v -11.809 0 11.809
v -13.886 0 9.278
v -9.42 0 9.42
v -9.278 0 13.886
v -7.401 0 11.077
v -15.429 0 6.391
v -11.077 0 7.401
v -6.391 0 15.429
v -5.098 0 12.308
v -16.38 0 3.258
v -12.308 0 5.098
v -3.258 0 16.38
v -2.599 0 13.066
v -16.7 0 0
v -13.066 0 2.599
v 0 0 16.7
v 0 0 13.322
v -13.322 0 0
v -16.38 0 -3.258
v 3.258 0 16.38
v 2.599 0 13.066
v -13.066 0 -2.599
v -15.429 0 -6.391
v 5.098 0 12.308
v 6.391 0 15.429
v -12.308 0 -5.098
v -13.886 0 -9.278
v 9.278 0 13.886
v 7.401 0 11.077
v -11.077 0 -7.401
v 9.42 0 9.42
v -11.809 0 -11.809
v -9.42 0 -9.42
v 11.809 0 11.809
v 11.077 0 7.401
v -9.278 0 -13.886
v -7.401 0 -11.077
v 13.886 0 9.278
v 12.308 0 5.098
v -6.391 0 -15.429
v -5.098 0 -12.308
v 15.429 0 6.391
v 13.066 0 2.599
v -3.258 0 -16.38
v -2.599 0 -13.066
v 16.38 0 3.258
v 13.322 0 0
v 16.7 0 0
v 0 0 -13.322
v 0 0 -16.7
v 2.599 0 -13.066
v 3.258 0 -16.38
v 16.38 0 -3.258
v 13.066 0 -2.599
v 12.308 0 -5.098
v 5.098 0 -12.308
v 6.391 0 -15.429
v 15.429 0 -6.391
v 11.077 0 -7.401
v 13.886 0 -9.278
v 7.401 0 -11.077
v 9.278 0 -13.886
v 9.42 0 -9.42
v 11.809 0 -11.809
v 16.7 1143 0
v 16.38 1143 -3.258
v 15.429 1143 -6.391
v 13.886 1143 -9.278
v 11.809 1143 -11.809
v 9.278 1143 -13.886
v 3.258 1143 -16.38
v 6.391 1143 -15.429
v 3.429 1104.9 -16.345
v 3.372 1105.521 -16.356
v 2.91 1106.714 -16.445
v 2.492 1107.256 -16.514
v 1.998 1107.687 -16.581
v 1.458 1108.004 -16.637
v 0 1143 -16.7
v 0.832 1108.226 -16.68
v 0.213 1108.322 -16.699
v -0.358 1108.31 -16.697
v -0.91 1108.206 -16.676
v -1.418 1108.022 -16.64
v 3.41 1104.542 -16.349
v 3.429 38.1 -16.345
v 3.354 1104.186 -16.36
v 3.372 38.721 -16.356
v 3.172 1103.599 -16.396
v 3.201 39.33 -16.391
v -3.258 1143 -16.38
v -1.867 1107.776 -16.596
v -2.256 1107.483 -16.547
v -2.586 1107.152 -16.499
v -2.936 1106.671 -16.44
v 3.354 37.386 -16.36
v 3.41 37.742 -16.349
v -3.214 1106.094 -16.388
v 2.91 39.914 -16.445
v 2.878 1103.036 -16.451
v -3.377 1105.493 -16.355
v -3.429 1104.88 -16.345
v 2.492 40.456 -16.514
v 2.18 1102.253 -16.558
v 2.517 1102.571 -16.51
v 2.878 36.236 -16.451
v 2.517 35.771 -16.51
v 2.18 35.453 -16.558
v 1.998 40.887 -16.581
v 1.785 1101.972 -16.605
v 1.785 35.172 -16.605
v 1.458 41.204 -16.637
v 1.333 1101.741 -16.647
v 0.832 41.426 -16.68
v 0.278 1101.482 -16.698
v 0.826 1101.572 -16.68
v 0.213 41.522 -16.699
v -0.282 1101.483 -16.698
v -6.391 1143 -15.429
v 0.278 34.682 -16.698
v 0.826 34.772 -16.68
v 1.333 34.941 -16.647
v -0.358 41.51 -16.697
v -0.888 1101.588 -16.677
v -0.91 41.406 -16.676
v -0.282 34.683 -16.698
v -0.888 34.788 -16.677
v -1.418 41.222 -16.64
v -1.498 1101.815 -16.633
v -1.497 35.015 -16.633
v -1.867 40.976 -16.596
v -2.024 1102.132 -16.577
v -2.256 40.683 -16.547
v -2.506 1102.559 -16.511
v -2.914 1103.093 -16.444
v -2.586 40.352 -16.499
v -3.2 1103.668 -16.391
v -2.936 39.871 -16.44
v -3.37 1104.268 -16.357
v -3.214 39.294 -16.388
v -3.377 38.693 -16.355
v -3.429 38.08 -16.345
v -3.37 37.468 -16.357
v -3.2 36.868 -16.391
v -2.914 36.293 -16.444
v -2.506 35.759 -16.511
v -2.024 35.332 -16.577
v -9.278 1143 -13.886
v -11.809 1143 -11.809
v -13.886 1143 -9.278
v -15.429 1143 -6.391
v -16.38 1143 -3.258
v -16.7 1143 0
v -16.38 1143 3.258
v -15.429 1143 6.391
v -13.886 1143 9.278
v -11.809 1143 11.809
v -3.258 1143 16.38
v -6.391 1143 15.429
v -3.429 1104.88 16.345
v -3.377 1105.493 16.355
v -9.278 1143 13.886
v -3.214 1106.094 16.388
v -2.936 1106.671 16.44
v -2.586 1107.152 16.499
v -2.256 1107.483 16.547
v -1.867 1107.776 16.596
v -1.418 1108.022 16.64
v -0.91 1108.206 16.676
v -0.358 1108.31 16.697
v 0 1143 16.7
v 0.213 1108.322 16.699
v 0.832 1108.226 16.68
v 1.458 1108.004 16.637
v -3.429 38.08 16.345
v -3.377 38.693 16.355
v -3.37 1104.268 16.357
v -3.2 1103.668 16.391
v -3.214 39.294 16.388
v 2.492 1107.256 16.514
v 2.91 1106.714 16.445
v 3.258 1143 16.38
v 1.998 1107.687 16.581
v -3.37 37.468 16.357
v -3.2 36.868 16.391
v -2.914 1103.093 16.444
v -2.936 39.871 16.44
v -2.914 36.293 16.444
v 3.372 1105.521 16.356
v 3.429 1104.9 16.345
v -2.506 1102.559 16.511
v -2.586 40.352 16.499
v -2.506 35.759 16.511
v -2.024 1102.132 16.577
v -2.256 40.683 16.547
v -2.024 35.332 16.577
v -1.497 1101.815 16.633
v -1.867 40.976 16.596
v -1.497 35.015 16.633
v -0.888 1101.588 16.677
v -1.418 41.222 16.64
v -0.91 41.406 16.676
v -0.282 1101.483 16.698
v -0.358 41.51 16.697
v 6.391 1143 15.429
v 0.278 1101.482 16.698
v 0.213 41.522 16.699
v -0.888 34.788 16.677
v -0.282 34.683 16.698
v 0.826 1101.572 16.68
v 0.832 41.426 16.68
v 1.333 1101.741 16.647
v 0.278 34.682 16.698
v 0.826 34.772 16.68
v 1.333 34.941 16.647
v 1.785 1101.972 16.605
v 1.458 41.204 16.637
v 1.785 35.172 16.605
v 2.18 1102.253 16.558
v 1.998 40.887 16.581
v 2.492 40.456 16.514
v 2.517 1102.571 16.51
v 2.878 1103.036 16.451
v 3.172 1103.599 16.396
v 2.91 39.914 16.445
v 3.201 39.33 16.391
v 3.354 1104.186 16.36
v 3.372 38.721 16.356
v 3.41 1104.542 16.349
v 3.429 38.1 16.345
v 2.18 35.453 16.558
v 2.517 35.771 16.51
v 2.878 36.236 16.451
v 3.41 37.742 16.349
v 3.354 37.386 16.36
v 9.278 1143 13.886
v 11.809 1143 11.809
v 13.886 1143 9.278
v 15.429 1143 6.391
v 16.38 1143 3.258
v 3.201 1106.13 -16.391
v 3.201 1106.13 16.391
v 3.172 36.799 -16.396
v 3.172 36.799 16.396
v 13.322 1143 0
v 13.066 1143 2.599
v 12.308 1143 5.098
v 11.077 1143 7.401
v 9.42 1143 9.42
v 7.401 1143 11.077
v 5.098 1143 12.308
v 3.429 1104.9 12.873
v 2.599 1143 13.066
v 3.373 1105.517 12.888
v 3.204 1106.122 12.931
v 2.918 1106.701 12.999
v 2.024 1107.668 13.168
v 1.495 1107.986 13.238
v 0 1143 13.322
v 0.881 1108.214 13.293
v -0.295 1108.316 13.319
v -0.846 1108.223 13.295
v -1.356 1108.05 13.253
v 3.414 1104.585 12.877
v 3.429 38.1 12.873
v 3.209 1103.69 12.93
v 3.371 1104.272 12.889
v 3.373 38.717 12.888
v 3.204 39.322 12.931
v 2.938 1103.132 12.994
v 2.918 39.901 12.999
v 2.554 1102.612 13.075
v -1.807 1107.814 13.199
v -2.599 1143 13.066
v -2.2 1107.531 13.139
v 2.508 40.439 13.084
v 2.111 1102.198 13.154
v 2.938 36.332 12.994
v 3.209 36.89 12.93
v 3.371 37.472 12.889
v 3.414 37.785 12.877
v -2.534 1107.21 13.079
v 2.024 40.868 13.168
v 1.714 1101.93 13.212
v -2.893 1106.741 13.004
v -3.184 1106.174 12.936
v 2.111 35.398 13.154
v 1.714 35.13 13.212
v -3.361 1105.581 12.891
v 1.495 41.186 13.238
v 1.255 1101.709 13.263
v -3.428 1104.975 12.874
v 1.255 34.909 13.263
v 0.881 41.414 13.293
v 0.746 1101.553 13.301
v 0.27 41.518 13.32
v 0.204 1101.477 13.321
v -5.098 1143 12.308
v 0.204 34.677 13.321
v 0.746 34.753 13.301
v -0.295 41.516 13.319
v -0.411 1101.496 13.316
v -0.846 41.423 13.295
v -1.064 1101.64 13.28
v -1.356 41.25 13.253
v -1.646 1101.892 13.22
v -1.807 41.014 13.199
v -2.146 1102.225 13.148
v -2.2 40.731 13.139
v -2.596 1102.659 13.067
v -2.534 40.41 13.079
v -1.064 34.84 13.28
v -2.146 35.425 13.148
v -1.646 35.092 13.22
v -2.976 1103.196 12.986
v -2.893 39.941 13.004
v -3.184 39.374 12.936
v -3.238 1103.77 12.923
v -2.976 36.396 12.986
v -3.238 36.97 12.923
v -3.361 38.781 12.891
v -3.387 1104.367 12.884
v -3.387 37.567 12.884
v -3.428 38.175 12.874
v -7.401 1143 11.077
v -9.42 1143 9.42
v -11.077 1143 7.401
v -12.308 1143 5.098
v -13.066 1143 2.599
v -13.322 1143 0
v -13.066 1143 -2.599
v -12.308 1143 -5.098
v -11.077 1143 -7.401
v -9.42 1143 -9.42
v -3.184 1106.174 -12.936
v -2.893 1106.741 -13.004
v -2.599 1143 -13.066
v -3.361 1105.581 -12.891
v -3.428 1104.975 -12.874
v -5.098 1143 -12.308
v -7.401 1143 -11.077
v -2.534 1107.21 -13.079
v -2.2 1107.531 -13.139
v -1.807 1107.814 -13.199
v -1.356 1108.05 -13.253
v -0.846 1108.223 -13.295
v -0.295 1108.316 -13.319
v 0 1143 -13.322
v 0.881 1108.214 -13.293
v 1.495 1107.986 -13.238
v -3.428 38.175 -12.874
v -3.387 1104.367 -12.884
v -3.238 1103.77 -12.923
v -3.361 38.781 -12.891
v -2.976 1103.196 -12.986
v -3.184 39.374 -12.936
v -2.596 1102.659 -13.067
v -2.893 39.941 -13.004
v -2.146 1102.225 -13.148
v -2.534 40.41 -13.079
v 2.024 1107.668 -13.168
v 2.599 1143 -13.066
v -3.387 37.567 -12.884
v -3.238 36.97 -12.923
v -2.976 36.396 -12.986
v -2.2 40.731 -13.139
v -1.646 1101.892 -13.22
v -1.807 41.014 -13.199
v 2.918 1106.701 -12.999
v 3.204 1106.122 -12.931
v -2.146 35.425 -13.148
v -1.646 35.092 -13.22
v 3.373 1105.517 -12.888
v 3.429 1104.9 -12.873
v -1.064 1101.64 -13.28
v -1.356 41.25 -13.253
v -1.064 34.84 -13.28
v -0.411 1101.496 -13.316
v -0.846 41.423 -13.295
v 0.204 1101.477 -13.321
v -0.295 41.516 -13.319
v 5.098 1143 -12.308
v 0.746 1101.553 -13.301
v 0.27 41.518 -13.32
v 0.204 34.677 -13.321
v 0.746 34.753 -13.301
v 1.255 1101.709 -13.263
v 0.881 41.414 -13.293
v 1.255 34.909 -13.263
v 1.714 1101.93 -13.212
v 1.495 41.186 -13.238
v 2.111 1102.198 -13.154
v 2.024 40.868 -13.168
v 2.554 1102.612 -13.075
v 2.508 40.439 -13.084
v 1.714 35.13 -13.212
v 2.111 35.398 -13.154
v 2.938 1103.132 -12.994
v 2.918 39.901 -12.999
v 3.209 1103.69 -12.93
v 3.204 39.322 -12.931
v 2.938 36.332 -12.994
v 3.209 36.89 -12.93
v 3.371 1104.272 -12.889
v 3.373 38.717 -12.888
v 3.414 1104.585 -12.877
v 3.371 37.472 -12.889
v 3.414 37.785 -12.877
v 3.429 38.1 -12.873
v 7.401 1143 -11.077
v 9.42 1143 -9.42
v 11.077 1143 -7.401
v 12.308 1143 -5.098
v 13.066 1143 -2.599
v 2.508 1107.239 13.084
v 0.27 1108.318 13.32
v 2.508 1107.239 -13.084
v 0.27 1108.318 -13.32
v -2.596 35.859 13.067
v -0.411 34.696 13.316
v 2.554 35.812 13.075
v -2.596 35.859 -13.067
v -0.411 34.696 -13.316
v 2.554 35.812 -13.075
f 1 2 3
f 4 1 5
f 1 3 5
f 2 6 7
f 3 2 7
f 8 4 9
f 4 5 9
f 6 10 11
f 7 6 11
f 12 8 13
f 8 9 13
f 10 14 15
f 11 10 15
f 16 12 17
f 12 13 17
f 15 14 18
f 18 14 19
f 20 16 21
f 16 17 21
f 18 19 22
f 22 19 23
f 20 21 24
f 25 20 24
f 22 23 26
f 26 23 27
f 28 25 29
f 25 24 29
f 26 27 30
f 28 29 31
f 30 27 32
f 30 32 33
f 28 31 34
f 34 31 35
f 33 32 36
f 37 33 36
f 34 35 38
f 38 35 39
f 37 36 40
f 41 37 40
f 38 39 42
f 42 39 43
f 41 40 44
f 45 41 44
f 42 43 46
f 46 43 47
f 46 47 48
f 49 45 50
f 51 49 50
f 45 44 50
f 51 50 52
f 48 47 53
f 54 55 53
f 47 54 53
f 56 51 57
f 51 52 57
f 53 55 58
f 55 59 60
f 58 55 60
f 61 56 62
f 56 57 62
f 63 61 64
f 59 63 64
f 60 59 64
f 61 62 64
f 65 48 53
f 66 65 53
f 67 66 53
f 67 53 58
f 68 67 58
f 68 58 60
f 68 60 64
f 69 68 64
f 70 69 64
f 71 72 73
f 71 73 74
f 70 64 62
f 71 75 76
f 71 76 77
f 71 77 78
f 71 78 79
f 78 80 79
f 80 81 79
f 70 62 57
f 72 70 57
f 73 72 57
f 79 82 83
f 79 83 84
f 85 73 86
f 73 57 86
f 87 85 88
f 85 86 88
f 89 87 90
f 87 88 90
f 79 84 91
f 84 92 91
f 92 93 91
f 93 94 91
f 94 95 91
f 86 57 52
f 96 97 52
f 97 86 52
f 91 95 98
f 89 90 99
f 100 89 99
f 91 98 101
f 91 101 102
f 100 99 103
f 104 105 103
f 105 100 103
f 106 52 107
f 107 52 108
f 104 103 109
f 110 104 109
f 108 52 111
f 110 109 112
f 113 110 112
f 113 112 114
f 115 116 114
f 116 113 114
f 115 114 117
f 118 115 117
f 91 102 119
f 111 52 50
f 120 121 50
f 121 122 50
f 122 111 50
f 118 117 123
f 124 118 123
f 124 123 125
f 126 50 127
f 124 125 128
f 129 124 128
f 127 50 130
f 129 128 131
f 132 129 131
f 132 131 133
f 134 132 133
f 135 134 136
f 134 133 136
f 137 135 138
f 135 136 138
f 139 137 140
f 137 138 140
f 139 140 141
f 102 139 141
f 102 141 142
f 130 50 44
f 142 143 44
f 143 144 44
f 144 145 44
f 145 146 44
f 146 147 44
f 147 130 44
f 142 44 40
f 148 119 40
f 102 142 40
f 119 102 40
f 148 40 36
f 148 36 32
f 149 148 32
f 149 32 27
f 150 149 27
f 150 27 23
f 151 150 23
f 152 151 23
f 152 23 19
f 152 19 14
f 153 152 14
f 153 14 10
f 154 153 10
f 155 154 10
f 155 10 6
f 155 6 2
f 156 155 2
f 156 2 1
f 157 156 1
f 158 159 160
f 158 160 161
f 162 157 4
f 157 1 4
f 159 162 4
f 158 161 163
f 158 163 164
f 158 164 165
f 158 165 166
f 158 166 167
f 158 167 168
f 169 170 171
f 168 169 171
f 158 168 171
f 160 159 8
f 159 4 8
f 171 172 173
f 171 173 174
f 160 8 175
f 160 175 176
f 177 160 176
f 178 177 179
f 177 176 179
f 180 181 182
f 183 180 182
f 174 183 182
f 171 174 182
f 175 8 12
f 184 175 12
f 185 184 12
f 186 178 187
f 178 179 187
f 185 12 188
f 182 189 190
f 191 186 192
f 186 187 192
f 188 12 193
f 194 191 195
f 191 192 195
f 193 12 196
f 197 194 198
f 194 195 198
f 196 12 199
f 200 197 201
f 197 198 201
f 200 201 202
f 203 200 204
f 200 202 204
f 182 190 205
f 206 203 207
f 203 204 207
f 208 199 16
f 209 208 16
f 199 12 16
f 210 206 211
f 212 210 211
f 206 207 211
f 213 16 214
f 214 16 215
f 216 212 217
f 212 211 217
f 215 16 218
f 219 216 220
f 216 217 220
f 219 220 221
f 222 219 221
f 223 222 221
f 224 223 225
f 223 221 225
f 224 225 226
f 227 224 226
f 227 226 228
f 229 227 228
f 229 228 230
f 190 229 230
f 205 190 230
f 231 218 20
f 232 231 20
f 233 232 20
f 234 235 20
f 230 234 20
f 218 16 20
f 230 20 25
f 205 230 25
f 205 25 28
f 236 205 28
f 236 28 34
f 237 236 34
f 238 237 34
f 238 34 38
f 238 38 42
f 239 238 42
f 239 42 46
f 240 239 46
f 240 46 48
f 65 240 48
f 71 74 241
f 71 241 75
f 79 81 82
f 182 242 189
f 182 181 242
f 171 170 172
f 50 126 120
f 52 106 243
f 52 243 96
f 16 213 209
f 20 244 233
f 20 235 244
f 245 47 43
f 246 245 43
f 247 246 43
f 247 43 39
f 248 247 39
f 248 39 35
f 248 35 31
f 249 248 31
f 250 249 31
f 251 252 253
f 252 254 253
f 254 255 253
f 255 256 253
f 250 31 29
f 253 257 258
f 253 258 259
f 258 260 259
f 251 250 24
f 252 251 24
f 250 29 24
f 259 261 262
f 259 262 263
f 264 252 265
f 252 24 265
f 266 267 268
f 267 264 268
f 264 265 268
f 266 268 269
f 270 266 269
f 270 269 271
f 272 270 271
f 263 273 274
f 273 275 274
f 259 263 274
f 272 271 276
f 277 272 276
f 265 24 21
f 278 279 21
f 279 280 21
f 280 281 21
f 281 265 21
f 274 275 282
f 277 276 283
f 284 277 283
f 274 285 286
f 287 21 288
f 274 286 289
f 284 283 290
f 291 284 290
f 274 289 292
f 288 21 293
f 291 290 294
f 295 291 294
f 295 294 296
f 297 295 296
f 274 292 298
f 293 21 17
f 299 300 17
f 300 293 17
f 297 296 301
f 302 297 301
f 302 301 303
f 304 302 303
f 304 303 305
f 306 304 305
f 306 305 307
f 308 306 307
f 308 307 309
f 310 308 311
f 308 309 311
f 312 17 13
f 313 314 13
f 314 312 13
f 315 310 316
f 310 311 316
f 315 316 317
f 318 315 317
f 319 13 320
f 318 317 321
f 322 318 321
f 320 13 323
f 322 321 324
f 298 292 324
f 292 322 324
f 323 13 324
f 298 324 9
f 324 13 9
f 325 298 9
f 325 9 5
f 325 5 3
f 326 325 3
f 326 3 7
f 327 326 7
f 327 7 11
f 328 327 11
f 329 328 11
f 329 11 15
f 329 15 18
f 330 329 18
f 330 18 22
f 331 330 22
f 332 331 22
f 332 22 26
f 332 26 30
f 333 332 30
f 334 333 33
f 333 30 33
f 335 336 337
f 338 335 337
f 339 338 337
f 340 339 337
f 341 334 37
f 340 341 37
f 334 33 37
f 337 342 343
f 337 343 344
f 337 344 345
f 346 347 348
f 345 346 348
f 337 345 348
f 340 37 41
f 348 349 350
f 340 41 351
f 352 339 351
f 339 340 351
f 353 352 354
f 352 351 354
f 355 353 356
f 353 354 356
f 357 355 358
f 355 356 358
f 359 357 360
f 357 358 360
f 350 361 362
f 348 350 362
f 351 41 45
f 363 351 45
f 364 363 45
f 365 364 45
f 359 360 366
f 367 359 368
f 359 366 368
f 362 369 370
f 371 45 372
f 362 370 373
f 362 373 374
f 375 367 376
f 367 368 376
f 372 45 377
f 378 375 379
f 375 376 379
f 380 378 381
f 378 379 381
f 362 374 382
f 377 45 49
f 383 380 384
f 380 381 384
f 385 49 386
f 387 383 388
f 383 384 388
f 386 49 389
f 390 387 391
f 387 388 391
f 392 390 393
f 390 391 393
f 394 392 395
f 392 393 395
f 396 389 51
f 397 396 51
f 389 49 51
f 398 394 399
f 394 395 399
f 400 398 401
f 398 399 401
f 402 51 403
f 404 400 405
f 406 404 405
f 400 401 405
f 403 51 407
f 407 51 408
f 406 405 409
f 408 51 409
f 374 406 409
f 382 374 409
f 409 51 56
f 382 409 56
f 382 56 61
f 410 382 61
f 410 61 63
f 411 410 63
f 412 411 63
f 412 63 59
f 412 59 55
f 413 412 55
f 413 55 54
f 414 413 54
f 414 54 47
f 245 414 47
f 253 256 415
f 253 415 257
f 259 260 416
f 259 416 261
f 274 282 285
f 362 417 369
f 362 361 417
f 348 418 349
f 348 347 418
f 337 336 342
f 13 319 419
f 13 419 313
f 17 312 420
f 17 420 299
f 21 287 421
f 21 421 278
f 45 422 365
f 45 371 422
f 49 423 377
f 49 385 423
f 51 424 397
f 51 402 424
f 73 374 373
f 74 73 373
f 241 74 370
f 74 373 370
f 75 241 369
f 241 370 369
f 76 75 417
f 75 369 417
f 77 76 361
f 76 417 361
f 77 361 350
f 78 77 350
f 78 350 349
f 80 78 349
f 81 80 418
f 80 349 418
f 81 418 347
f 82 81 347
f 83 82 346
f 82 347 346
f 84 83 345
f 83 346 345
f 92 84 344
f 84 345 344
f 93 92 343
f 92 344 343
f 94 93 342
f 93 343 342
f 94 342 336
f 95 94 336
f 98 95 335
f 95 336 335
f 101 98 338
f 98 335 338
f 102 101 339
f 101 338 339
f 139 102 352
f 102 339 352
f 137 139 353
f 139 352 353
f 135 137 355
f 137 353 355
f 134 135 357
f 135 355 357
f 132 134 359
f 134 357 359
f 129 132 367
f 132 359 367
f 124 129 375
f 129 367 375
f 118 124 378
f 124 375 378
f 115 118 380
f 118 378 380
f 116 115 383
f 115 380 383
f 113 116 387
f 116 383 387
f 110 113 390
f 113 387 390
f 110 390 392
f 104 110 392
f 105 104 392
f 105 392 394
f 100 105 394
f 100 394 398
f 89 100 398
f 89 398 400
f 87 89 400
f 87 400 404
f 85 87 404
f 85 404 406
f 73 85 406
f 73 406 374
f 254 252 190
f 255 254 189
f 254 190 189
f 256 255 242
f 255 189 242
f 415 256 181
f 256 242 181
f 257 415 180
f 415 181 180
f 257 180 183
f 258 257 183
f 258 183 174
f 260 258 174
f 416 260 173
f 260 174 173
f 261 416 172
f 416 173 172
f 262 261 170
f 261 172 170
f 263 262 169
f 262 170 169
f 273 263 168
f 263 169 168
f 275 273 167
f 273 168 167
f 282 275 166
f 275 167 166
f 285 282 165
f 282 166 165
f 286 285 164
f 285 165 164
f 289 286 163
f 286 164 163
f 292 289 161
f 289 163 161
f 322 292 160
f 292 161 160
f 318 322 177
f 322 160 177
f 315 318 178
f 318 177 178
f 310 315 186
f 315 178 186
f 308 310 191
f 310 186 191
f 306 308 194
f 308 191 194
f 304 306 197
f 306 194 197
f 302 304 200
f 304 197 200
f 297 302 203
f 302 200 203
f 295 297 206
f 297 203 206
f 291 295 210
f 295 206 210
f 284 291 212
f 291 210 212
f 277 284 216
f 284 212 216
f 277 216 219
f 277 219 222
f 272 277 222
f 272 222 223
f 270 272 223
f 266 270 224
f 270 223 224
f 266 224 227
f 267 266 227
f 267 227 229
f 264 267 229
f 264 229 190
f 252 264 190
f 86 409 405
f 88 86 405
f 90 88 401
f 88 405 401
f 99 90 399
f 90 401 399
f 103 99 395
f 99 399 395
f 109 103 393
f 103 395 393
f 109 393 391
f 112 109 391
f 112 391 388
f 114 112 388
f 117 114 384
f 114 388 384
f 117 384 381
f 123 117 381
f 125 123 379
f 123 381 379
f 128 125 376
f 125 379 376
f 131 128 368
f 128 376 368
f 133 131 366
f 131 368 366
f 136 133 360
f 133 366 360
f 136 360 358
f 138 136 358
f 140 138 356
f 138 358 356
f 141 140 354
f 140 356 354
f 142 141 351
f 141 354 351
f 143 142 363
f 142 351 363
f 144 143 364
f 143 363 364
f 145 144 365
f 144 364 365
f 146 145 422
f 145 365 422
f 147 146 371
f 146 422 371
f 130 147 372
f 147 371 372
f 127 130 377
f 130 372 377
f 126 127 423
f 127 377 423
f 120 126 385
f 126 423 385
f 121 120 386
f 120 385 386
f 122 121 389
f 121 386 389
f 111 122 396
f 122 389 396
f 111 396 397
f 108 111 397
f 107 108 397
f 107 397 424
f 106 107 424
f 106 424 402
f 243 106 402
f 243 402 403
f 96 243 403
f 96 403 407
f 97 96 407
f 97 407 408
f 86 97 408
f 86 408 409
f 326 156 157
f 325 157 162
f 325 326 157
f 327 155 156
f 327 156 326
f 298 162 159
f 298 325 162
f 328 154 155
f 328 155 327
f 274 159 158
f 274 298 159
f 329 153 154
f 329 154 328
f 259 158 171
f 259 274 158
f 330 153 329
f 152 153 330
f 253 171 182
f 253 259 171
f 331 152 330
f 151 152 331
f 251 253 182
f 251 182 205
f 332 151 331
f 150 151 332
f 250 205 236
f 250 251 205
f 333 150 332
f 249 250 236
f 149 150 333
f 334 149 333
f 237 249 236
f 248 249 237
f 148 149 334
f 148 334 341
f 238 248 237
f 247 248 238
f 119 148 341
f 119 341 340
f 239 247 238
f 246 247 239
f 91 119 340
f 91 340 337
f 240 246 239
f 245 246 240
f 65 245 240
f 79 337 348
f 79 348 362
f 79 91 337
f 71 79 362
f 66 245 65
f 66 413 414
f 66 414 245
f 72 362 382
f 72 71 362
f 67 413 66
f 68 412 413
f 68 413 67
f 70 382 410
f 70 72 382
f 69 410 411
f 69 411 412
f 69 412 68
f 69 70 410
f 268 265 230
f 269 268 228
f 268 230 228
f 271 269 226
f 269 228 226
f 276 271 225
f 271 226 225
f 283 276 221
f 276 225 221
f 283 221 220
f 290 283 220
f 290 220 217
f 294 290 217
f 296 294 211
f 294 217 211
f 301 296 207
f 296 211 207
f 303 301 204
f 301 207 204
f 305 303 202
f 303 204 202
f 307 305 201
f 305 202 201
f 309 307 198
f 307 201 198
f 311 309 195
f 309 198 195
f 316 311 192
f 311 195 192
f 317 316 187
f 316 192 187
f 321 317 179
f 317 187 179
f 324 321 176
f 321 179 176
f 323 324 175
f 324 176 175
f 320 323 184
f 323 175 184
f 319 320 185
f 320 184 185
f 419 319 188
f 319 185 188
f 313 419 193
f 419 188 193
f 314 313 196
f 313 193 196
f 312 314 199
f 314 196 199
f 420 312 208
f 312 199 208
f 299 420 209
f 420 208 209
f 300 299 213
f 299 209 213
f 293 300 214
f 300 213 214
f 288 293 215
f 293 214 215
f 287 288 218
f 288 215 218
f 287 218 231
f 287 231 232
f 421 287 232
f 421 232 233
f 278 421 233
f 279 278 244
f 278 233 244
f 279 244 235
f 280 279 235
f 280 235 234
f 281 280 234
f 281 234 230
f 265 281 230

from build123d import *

# Parameters (mm, degrees)
SKETCH1_R               = 16.7005
BOSS_EXTRUDE1_DEPTH     = 1143
CUT_EXTRUDE1_DEPTH      = 25.4
CUT_EXTRUDE1_DEPTH_BACK = 25.4
SKETCH2_R               = 3.429
SKETCH3_R               = 13.3223
CUT_EXTRUDE2_DEPTH      = 1144.243986923


with BuildPart() as part:
    # Sketch1 → Boss-Extrude1 (new body)
    with BuildSketch(Plane(origin=(0, 0, 0), x_dir=(1, 0, 0), z_dir=(0, 1, 0))):
        Circle(SKETCH1_R)
    extrude(amount=BOSS_EXTRUDE1_DEPTH)

    # Sketch2 → Cut-Extrude1 (cut, two sides: drawn at the far end of the back side and taken through both)
    with BuildSketch(Plane.XY.offset(-CUT_EXTRUDE1_DEPTH_BACK)):
        with Locations((0, 38.1)):
            Circle(SKETCH2_R)
        with Locations((0, 1104.9)):
            Circle(SKETCH2_R)
    extrude(amount=CUT_EXTRUDE1_DEPTH + CUT_EXTRUDE1_DEPTH_BACK, mode=Mode.SUBTRACT)

    # Sketch3 → Cut-Extrude2 (cut, through all)
    with BuildSketch(Plane.XZ):
        Circle(SKETCH3_R)
    extrude(amount=-CUT_EXTRUDE2_DEPTH, mode=Mode.SUBTRACT)


solid = part.part
